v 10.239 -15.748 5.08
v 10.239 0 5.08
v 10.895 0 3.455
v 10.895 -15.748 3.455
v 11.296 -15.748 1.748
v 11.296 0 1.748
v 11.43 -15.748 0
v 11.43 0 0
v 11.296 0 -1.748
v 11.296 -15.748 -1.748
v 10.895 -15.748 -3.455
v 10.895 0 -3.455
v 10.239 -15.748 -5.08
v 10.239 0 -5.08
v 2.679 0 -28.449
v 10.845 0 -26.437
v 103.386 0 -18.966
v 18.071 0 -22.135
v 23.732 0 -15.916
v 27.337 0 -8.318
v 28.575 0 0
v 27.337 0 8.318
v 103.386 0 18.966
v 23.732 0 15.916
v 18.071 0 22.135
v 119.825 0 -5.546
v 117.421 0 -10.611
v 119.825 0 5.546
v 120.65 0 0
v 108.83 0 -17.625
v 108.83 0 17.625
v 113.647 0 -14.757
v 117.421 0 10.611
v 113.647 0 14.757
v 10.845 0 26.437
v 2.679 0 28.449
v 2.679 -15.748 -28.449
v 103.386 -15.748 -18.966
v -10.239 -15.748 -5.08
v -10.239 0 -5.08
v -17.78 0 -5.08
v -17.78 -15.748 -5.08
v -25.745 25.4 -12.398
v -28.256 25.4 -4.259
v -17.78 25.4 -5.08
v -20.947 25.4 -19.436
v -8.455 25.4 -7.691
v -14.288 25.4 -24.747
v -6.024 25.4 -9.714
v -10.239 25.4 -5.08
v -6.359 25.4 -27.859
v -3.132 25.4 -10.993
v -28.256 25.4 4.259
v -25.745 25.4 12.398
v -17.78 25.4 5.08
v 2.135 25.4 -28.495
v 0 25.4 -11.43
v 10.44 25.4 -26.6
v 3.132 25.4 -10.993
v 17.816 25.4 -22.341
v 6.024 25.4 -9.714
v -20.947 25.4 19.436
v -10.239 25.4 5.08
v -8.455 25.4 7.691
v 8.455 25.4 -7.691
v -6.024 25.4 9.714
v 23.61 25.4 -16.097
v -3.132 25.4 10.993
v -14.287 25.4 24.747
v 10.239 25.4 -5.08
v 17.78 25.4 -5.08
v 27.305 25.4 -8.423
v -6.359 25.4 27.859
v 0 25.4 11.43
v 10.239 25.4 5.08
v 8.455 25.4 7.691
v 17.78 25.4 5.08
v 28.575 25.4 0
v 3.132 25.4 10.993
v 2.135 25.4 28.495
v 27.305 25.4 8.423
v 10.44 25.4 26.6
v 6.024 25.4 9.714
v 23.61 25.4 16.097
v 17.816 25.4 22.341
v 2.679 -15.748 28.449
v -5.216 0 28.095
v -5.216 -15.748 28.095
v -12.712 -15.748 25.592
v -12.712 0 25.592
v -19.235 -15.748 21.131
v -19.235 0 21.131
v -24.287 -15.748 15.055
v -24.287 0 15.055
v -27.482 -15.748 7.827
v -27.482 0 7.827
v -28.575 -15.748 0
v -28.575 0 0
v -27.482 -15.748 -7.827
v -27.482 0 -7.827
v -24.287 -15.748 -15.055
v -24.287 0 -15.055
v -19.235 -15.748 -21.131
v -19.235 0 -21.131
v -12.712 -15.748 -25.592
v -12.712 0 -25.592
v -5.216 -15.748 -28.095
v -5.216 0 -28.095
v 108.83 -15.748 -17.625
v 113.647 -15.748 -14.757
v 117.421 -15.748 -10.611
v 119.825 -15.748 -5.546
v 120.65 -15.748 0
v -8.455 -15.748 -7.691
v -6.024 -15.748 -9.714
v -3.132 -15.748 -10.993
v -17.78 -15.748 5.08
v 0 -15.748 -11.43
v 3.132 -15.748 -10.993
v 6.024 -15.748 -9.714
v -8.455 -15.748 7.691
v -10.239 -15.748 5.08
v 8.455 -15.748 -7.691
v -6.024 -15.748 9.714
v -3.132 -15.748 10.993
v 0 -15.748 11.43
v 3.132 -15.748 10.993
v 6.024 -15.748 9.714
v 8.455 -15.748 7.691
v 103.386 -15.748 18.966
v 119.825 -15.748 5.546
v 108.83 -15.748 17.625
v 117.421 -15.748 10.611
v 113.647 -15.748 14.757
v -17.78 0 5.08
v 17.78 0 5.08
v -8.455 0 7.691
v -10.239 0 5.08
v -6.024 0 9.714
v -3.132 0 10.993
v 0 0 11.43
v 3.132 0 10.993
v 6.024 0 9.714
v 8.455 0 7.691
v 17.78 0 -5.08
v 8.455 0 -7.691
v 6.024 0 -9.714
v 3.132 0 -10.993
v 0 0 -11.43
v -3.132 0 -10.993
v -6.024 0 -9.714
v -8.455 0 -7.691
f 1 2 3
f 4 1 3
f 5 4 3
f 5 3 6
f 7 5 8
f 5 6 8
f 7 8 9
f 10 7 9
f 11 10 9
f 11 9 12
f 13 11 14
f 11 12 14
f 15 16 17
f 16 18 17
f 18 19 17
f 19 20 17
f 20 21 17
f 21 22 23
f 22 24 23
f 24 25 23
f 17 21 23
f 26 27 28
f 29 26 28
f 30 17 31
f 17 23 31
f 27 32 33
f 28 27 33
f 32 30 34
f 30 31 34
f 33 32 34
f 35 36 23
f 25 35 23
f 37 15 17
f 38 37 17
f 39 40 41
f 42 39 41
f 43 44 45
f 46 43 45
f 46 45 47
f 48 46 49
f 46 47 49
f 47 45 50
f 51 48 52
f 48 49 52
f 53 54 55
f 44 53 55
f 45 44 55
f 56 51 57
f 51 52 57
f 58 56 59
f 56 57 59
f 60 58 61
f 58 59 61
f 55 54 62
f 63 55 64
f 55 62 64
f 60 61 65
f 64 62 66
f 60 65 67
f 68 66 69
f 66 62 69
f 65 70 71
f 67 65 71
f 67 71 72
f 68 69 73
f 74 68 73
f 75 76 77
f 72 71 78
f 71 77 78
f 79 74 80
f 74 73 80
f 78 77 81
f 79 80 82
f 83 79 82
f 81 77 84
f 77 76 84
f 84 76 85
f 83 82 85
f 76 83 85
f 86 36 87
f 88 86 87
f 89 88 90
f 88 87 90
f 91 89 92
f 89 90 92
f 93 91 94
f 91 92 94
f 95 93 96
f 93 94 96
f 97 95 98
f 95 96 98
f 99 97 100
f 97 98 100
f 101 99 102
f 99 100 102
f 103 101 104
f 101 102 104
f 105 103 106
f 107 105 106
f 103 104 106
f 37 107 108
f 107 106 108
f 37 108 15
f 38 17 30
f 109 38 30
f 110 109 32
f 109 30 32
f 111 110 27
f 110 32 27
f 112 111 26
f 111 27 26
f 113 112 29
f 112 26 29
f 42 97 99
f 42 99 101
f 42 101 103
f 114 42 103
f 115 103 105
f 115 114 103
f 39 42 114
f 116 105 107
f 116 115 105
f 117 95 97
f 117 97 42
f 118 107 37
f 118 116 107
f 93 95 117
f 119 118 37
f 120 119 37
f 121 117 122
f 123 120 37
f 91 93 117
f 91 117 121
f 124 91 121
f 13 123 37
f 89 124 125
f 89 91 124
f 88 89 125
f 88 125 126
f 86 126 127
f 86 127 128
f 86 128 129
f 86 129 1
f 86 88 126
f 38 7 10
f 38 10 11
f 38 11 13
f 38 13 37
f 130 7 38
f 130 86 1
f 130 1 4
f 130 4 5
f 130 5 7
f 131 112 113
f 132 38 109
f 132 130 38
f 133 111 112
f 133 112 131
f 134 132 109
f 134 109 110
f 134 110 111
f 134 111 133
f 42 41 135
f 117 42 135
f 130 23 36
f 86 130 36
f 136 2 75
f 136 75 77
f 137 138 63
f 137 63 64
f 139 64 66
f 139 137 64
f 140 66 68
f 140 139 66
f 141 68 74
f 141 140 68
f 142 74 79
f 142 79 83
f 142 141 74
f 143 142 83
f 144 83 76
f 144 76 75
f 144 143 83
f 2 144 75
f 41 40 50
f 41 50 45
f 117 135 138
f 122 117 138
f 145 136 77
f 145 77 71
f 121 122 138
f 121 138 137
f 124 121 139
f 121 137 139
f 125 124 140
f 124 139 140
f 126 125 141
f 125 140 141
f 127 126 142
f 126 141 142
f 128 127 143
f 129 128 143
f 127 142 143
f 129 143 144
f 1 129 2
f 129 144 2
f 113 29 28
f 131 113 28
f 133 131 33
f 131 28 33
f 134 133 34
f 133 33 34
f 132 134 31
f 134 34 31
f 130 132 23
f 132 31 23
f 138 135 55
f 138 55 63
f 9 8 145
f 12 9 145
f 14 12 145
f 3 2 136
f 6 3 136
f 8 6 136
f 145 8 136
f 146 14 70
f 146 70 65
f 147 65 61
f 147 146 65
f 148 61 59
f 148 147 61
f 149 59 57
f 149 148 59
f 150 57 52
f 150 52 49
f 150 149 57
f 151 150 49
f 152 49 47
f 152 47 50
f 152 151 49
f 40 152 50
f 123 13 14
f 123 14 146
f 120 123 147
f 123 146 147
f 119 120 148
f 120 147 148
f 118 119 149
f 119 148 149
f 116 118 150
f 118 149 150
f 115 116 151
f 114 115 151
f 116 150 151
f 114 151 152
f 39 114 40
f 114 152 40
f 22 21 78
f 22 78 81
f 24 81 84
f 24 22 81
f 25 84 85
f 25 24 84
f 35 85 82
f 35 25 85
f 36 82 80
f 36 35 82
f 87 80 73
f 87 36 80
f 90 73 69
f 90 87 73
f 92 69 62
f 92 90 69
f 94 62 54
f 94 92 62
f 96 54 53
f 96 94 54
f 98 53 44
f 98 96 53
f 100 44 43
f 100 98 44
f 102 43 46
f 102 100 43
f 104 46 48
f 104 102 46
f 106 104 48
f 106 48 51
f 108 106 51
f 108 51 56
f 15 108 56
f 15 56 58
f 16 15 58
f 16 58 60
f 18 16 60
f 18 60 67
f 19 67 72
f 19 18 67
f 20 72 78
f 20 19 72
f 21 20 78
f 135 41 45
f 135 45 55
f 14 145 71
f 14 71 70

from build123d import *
from build123d import SkipClean  # not in build123d's __all__

# Parameters (mm, degrees)
F0_R     = 11.43
F1_DEPTH = 15.748
F2_DEPTH = 25.4


with BuildPart() as f1:
    # F0 (on Front) → F1 (new body)
    with BuildSketch(Plane.XZ):
        with BuildLine():
            ThreePointArc((2.67890625, 28.4491491315), (21.1314974753, 19.2351355455), (28.575, 0))
            ThreePointArc((28.575, 0), (21.1314974753, -19.2351355455), (2.67890625, -28.4491491315))
            Line((2.67890625, -28.4491491315), (103.3859375, -18.966099421))
            ThreePointArc((103.3859375, -18.966099421), (82.55, 0), (103.3859375, 18.966099421))
            Line((103.3859375, 18.966099421), (2.67890625, 28.4491491315))
        make_face()
        with BuildLine():
            ThreePointArc((2.67890625, -28.4491491315), (21.1314974753, -19.2351355455), (28.575, 0))
            ThreePointArc((28.575, 0), (21.1314974753, 19.2351355455), (2.67890625, 28.4491491315))
            ThreePointArc((2.67890625, 28.4491491315), (-28.575, 0), (2.67890625, -28.4491491315))
        make_face()
        with BuildLine():
            ThreePointArc((-10.2390673403, 5.08), (0, 11.43), (10.2390673403, 5.08))
            Line((10.2390673403, 5.08), (17.78, 5.08))
            Line((17.78, 5.08), (17.78, -5.08))
            Line((17.78, -5.08), (10.2390673403, -5.08))
            ThreePointArc((10.2390673403, -5.08), (0, -11.43), (-10.2390673403, -5.08))
            Line((-10.2390673403, -5.08), (-17.78, -5.08))
            Line((-17.78, -5.08), (-17.78, 5.08))
            Line((-17.78, 5.08), (-10.2390673403, 5.08))
        make_face(mode=Mode.SUBTRACT)
        with BuildLine():
            ThreePointArc((120.65, 0), (115.6876649835, 12.823423697), (103.3859375, 18.966099421))
            ThreePointArc((103.3859375, 18.966099421), (82.55, 0), (103.3859375, -18.966099421))
            ThreePointArc((103.3859375, -18.966099421), (115.6876649835, -12.823423697), (120.65, 0))
        make_face()
        with Locations((101.6, 0)):
            Circle(F0_R, mode=Mode.SUBTRACT)
        with Locations((101.6, 0)):
            Circle(F0_R)
        with BuildLine():
            ThreePointArc((10.2390673403, 5.08), (11.1282846769, 2.6088656826), (11.43, 0))
            ThreePointArc((11.43, 0), (11.1282846769, -2.6088656826), (10.2390673403, -5.08))
            Line((10.2390673403, -5.08), (17.78, -5.08))
            Line((17.78, -5.08), (17.78, 5.08))
            Line((17.78, 5.08), (10.2390673403, 5.08))
        make_face()
    extrude(amount=F1_DEPTH)

    # F0 (on Front) → F2 (join)
    with BuildSketch(Plane.XZ):
        with BuildLine():
            ThreePointArc((2.67890625, -28.4491491315), (21.1314974753, -19.2351355455), (28.575, 0))
            ThreePointArc((28.575, 0), (21.1314974753, 19.2351355455), (2.67890625, 28.4491491315))
            ThreePointArc((2.67890625, 28.4491491315), (-28.575, 0), (2.67890625, -28.4491491315))
        make_face()
        with BuildLine():
            ThreePointArc((-10.2390673403, 5.08), (0, 11.43), (10.2390673403, 5.08))
            Line((10.2390673403, 5.08), (17.78, 5.08))
            Line((17.78, 5.08), (17.78, -5.08))
            Line((17.78, -5.08), (10.2390673403, -5.08))
            ThreePointArc((10.2390673403, -5.08), (0, -11.43), (-10.2390673403, -5.08))
            Line((-10.2390673403, -5.08), (-17.78, -5.08))
            Line((-17.78, -5.08), (-17.78, 5.08))
            Line((-17.78, 5.08), (-10.2390673403, 5.08))
        make_face(mode=Mode.SUBTRACT)
    with SkipClean():  # cleaning this boolean's faces spoils the solid; the shape is the same uncleaned
        extrude(amount=-F2_DEPTH)


solid = f1.part
